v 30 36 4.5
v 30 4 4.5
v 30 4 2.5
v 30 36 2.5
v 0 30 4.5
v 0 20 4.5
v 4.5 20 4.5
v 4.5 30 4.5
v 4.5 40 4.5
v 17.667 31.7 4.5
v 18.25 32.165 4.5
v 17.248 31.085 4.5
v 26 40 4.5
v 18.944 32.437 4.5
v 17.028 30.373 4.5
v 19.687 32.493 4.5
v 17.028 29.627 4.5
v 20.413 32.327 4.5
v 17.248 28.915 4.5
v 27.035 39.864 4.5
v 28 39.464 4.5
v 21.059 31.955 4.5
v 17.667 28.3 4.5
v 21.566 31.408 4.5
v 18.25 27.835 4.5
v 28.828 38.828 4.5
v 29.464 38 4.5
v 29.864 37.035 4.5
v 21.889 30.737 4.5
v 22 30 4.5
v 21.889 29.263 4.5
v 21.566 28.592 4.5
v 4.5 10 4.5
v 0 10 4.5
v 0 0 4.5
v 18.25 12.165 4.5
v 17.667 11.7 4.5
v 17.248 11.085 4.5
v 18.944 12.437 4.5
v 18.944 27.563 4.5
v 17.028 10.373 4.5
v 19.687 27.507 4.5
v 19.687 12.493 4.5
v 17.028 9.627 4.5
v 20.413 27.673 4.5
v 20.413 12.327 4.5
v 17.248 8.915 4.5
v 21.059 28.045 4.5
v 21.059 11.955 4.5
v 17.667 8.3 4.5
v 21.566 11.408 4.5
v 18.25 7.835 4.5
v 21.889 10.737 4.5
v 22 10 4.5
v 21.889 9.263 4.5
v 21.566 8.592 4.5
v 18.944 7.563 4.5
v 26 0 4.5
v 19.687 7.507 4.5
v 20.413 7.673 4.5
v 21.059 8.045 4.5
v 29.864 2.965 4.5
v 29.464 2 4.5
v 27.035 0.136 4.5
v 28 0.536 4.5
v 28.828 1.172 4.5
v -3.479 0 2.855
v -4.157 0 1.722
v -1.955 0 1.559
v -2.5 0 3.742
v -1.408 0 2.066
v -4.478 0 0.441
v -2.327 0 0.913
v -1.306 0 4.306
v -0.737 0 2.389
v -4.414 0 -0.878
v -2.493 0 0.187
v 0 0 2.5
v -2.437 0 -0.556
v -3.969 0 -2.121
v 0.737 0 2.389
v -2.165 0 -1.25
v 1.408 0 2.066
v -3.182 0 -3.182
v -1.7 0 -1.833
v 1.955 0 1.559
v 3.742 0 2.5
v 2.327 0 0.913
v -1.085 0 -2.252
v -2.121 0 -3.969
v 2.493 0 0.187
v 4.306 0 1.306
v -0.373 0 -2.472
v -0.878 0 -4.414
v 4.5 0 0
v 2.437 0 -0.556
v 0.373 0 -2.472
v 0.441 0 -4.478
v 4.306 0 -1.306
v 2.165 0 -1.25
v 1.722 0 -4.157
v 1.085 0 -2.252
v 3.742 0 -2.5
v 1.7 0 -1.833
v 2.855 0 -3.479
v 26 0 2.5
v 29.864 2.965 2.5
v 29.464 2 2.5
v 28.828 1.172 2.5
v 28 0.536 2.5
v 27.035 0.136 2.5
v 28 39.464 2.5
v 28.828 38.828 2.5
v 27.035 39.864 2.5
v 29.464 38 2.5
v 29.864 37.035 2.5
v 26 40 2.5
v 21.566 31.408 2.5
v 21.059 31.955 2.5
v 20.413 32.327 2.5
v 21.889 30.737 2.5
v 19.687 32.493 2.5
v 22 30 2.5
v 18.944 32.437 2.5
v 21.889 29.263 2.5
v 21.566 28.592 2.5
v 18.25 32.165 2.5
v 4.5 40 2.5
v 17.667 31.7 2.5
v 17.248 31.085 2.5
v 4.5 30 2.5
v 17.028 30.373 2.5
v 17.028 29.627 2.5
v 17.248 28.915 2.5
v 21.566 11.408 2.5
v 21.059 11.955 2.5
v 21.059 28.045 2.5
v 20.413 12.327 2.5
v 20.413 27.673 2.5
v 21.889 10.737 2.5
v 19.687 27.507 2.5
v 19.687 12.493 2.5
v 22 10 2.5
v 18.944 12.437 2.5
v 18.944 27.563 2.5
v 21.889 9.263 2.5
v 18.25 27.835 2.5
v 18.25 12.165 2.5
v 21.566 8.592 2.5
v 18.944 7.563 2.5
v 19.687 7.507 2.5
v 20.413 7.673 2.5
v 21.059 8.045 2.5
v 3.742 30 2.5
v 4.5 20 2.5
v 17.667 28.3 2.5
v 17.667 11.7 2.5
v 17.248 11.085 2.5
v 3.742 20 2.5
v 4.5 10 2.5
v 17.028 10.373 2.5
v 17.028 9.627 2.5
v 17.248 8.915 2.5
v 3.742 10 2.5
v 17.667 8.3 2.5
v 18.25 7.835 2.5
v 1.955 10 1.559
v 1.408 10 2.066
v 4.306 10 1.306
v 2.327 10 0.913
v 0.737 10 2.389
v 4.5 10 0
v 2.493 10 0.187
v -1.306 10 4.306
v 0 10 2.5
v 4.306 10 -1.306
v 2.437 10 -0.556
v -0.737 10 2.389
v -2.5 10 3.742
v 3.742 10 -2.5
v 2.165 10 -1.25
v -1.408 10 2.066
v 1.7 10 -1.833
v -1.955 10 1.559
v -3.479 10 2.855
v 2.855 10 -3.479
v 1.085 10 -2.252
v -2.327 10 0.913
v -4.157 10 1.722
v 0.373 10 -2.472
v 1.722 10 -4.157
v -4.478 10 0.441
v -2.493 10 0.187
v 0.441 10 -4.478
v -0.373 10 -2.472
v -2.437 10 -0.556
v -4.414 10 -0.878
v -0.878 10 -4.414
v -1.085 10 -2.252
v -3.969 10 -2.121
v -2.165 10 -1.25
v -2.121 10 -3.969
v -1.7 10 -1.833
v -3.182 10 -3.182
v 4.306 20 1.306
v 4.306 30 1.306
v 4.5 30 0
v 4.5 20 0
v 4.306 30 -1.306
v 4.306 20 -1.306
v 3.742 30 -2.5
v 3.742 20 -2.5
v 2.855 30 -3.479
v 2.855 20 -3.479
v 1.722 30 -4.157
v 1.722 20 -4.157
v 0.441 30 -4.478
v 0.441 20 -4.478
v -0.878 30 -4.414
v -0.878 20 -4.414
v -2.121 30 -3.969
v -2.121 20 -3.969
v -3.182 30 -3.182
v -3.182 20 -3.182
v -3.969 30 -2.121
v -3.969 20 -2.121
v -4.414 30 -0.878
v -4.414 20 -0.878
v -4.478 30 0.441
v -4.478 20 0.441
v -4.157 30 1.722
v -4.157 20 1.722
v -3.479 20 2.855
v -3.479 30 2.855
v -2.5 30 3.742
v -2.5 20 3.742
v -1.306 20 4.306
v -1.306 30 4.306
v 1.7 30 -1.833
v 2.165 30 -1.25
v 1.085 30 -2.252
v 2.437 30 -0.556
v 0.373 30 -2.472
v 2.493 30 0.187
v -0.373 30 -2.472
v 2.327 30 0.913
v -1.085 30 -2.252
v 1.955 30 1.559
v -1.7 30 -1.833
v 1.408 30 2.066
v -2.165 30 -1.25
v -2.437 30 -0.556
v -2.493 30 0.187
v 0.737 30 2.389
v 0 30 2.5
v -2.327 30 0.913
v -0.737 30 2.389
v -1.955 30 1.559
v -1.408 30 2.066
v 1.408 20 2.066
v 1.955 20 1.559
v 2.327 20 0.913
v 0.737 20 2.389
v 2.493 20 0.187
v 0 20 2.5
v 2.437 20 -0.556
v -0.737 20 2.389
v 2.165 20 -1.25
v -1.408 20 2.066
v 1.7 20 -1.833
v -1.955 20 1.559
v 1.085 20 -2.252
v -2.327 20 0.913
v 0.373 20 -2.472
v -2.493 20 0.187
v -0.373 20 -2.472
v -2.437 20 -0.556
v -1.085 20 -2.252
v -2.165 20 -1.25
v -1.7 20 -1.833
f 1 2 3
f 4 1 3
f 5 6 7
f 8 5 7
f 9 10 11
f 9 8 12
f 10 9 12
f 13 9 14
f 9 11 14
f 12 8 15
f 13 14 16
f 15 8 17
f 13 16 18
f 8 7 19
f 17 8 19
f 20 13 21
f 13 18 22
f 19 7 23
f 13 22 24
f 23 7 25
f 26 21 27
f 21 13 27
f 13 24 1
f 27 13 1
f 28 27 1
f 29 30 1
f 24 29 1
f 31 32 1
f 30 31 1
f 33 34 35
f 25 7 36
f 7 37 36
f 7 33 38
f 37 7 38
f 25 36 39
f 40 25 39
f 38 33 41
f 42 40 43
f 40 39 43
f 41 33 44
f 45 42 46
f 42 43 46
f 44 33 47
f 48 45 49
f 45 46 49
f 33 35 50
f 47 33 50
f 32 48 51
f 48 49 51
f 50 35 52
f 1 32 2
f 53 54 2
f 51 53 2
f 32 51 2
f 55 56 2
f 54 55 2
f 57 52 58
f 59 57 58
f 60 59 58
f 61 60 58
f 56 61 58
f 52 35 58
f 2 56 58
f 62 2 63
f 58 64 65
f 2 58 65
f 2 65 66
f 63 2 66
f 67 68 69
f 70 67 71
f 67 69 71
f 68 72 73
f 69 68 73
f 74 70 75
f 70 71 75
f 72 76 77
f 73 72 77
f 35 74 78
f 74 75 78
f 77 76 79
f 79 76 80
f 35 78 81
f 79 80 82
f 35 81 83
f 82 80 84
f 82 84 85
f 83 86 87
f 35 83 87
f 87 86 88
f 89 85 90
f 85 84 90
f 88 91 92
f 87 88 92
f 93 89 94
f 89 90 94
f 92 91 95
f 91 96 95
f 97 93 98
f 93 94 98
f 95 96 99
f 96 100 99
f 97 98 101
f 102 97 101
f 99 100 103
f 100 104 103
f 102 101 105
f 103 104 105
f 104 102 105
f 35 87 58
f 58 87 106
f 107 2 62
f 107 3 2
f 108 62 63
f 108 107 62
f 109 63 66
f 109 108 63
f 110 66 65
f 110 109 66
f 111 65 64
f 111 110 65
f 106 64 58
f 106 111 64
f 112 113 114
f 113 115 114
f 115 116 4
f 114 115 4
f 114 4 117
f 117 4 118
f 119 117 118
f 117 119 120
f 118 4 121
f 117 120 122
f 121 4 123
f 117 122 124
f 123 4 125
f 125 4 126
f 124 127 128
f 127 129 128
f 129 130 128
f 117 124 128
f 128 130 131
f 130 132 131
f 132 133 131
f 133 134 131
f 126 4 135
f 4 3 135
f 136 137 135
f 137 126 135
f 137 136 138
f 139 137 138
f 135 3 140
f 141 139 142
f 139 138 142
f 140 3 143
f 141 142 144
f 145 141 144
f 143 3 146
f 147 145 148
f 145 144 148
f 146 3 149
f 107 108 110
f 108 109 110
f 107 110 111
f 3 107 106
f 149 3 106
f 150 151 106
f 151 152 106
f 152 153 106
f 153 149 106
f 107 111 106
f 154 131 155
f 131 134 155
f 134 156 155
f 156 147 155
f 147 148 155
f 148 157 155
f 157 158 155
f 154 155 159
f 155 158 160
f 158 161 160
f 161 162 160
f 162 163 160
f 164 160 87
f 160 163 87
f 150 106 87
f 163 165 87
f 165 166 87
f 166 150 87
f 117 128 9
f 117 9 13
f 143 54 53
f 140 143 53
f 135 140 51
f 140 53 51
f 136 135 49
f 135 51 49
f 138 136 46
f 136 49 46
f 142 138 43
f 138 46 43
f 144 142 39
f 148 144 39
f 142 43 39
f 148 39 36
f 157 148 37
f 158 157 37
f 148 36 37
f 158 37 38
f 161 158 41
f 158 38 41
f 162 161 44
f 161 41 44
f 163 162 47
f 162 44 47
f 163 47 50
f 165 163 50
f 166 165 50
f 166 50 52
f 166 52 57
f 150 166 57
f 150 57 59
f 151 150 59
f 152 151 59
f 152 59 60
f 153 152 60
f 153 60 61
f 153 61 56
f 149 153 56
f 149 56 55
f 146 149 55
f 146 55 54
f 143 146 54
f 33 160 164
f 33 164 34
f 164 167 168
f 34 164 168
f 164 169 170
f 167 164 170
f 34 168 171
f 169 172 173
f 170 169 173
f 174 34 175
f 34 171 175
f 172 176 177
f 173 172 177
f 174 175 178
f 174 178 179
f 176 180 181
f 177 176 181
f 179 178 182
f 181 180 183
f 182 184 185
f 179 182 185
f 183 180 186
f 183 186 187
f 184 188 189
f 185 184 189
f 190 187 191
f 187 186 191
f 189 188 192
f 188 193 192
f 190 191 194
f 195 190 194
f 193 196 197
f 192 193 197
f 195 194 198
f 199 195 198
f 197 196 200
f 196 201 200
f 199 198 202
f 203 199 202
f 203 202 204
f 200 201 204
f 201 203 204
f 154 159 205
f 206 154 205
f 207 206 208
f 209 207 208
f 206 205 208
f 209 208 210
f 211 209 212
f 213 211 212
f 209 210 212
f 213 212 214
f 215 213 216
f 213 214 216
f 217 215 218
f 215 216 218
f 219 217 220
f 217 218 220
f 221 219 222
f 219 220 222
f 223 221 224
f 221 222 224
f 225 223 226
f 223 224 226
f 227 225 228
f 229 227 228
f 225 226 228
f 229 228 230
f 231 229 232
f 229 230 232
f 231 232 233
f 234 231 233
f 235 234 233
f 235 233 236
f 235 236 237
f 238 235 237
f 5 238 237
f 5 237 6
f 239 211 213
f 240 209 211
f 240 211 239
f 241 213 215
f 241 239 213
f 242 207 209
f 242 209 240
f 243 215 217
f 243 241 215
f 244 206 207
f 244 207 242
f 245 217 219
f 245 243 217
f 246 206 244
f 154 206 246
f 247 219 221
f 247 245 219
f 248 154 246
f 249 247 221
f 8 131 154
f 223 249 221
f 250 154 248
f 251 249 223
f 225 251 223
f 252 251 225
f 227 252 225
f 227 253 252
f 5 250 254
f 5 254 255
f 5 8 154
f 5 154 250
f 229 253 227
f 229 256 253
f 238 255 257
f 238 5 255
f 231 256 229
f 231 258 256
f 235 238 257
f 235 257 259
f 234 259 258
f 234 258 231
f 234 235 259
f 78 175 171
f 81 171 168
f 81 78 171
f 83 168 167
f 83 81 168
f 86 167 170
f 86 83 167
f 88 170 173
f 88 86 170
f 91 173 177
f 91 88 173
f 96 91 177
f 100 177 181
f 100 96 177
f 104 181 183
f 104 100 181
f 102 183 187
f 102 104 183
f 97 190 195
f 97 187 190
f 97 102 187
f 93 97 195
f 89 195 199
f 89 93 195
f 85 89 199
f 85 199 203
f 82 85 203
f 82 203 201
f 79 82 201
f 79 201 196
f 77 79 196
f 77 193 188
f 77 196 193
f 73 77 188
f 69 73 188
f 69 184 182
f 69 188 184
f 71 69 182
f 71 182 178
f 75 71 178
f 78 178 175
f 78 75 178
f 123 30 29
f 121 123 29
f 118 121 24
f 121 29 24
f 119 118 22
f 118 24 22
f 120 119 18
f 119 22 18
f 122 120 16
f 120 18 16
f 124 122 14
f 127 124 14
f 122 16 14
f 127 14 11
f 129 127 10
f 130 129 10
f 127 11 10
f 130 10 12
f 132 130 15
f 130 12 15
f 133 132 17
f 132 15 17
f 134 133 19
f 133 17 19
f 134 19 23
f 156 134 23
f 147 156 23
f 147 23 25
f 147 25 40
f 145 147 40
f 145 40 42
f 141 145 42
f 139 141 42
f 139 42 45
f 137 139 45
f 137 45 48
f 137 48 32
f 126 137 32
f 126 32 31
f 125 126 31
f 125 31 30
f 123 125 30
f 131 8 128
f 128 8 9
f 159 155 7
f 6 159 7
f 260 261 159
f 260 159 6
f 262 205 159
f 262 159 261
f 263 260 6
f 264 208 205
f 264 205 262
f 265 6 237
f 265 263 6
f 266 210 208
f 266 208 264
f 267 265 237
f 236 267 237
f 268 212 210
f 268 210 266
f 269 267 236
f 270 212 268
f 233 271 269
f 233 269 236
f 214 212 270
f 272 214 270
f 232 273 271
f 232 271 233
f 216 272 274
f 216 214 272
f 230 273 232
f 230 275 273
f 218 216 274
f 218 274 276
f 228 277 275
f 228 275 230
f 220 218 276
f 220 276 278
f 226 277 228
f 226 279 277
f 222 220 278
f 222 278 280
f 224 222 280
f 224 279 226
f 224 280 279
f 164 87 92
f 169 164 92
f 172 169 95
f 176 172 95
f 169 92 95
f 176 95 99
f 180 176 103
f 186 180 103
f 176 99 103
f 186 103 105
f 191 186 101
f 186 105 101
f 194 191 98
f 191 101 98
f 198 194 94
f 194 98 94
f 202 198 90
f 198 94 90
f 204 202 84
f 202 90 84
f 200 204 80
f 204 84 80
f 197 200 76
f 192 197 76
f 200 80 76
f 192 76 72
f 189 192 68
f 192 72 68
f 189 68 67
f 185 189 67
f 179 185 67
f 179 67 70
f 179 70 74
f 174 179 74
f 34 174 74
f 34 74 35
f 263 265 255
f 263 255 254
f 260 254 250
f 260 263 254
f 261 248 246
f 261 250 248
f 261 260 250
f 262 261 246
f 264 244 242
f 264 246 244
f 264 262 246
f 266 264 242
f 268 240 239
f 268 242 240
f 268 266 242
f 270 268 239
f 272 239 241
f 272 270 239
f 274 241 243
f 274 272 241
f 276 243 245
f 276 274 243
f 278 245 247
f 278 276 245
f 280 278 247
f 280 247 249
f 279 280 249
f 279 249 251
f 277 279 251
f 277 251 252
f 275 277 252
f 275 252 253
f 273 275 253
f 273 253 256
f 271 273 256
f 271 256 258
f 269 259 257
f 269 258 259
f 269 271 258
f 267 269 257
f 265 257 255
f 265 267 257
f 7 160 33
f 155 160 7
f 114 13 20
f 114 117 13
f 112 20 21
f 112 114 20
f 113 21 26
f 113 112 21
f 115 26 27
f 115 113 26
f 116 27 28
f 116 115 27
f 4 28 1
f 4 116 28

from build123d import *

# Parameters (mm, degrees)
SKETCH_1_R          = 2.5
EXTRUDE_1_DEPTH     = 40
CUT_EXTRUDE_1_REACH = 52.804
SKETCH_2_R          = 2.5
SKETCH_3_W          = 9
SKETCH_3_H          = 10
CUT_EXTRUDE_2_DEPTH = 20
FILLET_1_R          = 4


with BuildPart() as part:
    # 草图1 → 凸台-拉伸1 (new body)
    with BuildSketch(Plane(origin=(0, 0, 0), x_dir=(1, 0, 0), z_dir=(0, 1, 0))):
        with BuildLine():
            Line((0, -4.5), (30, -4.5))
            Line((30, -4.5), (30, -2.5))
            Line((30, -2.5), (3.741657387, -2.5))
            ThreePointArc((3.741657387, -2.5), (-2.121320344, 3.968626967), (0, -4.5))
        make_face()
        with Locations(Location((0, 0, 0), (0, 0, 270))):
            Circle(SKETCH_1_R, mode=Mode.SUBTRACT)
    extrude(amount=EXTRUDE_1_DEPTH)

    # 草图2 → 切除-拉伸1 (cut, up to next)
    with BuildSketch(Plane.XY.offset(4.5), mode=Mode.PRIVATE) as cut_extrude_1_sk1:
        with Locations((19.5, 30)):
            Circle(SKETCH_2_R)
    cut_extrude_1_tool1 = extrude(cut_extrude_1_sk1.sketch, amount=-CUT_EXTRUDE_1_REACH, mode=Mode.PRIVATE) & part.part
    # 草图2 → 切除-拉伸1 (cut, up to next)
    with BuildSketch(Plane.XY.offset(4.5), mode=Mode.PRIVATE) as cut_extrude_1_sk2:
        with Locations((19.5, 10)):
            Circle(SKETCH_2_R)
    cut_extrude_1_tool2 = extrude(cut_extrude_1_sk2.sketch, amount=-CUT_EXTRUDE_1_REACH, mode=Mode.PRIVATE) & part.part
    add(cut_extrude_1_tool1.solids().sort_by_distance((19.5, 30, 4.5))[0], mode=Mode.SUBTRACT)
    add(cut_extrude_1_tool2.solids().sort_by_distance((19.5, 10, 4.5))[0], mode=Mode.SUBTRACT)

    # 草图3 → 切除-拉伸2 (cut, symmetric)
    with BuildSketch(Plane(origin=(0, 0, 2.5), x_dir=(-1, 0, 0), z_dir=(0, 0, -1))):
        with Locations((0, 35)):
            Rectangle(SKETCH_3_W, SKETCH_3_H)
        with Locations((0, 15)):
            Rectangle(SKETCH_3_W, SKETCH_3_H)
    extrude(amount=CUT_EXTRUDE_2_DEPTH, both=True, mode=Mode.SUBTRACT)

    # 圆角1
    fillet_1_edges = [part.edges().sort_by_distance(p)[0] for p in [
        (30, 40, 3.5),
        (30, 0, 3.5),
    ]]
    fillet(fillet_1_edges, radius=FILLET_1_R)


solid = part.part
